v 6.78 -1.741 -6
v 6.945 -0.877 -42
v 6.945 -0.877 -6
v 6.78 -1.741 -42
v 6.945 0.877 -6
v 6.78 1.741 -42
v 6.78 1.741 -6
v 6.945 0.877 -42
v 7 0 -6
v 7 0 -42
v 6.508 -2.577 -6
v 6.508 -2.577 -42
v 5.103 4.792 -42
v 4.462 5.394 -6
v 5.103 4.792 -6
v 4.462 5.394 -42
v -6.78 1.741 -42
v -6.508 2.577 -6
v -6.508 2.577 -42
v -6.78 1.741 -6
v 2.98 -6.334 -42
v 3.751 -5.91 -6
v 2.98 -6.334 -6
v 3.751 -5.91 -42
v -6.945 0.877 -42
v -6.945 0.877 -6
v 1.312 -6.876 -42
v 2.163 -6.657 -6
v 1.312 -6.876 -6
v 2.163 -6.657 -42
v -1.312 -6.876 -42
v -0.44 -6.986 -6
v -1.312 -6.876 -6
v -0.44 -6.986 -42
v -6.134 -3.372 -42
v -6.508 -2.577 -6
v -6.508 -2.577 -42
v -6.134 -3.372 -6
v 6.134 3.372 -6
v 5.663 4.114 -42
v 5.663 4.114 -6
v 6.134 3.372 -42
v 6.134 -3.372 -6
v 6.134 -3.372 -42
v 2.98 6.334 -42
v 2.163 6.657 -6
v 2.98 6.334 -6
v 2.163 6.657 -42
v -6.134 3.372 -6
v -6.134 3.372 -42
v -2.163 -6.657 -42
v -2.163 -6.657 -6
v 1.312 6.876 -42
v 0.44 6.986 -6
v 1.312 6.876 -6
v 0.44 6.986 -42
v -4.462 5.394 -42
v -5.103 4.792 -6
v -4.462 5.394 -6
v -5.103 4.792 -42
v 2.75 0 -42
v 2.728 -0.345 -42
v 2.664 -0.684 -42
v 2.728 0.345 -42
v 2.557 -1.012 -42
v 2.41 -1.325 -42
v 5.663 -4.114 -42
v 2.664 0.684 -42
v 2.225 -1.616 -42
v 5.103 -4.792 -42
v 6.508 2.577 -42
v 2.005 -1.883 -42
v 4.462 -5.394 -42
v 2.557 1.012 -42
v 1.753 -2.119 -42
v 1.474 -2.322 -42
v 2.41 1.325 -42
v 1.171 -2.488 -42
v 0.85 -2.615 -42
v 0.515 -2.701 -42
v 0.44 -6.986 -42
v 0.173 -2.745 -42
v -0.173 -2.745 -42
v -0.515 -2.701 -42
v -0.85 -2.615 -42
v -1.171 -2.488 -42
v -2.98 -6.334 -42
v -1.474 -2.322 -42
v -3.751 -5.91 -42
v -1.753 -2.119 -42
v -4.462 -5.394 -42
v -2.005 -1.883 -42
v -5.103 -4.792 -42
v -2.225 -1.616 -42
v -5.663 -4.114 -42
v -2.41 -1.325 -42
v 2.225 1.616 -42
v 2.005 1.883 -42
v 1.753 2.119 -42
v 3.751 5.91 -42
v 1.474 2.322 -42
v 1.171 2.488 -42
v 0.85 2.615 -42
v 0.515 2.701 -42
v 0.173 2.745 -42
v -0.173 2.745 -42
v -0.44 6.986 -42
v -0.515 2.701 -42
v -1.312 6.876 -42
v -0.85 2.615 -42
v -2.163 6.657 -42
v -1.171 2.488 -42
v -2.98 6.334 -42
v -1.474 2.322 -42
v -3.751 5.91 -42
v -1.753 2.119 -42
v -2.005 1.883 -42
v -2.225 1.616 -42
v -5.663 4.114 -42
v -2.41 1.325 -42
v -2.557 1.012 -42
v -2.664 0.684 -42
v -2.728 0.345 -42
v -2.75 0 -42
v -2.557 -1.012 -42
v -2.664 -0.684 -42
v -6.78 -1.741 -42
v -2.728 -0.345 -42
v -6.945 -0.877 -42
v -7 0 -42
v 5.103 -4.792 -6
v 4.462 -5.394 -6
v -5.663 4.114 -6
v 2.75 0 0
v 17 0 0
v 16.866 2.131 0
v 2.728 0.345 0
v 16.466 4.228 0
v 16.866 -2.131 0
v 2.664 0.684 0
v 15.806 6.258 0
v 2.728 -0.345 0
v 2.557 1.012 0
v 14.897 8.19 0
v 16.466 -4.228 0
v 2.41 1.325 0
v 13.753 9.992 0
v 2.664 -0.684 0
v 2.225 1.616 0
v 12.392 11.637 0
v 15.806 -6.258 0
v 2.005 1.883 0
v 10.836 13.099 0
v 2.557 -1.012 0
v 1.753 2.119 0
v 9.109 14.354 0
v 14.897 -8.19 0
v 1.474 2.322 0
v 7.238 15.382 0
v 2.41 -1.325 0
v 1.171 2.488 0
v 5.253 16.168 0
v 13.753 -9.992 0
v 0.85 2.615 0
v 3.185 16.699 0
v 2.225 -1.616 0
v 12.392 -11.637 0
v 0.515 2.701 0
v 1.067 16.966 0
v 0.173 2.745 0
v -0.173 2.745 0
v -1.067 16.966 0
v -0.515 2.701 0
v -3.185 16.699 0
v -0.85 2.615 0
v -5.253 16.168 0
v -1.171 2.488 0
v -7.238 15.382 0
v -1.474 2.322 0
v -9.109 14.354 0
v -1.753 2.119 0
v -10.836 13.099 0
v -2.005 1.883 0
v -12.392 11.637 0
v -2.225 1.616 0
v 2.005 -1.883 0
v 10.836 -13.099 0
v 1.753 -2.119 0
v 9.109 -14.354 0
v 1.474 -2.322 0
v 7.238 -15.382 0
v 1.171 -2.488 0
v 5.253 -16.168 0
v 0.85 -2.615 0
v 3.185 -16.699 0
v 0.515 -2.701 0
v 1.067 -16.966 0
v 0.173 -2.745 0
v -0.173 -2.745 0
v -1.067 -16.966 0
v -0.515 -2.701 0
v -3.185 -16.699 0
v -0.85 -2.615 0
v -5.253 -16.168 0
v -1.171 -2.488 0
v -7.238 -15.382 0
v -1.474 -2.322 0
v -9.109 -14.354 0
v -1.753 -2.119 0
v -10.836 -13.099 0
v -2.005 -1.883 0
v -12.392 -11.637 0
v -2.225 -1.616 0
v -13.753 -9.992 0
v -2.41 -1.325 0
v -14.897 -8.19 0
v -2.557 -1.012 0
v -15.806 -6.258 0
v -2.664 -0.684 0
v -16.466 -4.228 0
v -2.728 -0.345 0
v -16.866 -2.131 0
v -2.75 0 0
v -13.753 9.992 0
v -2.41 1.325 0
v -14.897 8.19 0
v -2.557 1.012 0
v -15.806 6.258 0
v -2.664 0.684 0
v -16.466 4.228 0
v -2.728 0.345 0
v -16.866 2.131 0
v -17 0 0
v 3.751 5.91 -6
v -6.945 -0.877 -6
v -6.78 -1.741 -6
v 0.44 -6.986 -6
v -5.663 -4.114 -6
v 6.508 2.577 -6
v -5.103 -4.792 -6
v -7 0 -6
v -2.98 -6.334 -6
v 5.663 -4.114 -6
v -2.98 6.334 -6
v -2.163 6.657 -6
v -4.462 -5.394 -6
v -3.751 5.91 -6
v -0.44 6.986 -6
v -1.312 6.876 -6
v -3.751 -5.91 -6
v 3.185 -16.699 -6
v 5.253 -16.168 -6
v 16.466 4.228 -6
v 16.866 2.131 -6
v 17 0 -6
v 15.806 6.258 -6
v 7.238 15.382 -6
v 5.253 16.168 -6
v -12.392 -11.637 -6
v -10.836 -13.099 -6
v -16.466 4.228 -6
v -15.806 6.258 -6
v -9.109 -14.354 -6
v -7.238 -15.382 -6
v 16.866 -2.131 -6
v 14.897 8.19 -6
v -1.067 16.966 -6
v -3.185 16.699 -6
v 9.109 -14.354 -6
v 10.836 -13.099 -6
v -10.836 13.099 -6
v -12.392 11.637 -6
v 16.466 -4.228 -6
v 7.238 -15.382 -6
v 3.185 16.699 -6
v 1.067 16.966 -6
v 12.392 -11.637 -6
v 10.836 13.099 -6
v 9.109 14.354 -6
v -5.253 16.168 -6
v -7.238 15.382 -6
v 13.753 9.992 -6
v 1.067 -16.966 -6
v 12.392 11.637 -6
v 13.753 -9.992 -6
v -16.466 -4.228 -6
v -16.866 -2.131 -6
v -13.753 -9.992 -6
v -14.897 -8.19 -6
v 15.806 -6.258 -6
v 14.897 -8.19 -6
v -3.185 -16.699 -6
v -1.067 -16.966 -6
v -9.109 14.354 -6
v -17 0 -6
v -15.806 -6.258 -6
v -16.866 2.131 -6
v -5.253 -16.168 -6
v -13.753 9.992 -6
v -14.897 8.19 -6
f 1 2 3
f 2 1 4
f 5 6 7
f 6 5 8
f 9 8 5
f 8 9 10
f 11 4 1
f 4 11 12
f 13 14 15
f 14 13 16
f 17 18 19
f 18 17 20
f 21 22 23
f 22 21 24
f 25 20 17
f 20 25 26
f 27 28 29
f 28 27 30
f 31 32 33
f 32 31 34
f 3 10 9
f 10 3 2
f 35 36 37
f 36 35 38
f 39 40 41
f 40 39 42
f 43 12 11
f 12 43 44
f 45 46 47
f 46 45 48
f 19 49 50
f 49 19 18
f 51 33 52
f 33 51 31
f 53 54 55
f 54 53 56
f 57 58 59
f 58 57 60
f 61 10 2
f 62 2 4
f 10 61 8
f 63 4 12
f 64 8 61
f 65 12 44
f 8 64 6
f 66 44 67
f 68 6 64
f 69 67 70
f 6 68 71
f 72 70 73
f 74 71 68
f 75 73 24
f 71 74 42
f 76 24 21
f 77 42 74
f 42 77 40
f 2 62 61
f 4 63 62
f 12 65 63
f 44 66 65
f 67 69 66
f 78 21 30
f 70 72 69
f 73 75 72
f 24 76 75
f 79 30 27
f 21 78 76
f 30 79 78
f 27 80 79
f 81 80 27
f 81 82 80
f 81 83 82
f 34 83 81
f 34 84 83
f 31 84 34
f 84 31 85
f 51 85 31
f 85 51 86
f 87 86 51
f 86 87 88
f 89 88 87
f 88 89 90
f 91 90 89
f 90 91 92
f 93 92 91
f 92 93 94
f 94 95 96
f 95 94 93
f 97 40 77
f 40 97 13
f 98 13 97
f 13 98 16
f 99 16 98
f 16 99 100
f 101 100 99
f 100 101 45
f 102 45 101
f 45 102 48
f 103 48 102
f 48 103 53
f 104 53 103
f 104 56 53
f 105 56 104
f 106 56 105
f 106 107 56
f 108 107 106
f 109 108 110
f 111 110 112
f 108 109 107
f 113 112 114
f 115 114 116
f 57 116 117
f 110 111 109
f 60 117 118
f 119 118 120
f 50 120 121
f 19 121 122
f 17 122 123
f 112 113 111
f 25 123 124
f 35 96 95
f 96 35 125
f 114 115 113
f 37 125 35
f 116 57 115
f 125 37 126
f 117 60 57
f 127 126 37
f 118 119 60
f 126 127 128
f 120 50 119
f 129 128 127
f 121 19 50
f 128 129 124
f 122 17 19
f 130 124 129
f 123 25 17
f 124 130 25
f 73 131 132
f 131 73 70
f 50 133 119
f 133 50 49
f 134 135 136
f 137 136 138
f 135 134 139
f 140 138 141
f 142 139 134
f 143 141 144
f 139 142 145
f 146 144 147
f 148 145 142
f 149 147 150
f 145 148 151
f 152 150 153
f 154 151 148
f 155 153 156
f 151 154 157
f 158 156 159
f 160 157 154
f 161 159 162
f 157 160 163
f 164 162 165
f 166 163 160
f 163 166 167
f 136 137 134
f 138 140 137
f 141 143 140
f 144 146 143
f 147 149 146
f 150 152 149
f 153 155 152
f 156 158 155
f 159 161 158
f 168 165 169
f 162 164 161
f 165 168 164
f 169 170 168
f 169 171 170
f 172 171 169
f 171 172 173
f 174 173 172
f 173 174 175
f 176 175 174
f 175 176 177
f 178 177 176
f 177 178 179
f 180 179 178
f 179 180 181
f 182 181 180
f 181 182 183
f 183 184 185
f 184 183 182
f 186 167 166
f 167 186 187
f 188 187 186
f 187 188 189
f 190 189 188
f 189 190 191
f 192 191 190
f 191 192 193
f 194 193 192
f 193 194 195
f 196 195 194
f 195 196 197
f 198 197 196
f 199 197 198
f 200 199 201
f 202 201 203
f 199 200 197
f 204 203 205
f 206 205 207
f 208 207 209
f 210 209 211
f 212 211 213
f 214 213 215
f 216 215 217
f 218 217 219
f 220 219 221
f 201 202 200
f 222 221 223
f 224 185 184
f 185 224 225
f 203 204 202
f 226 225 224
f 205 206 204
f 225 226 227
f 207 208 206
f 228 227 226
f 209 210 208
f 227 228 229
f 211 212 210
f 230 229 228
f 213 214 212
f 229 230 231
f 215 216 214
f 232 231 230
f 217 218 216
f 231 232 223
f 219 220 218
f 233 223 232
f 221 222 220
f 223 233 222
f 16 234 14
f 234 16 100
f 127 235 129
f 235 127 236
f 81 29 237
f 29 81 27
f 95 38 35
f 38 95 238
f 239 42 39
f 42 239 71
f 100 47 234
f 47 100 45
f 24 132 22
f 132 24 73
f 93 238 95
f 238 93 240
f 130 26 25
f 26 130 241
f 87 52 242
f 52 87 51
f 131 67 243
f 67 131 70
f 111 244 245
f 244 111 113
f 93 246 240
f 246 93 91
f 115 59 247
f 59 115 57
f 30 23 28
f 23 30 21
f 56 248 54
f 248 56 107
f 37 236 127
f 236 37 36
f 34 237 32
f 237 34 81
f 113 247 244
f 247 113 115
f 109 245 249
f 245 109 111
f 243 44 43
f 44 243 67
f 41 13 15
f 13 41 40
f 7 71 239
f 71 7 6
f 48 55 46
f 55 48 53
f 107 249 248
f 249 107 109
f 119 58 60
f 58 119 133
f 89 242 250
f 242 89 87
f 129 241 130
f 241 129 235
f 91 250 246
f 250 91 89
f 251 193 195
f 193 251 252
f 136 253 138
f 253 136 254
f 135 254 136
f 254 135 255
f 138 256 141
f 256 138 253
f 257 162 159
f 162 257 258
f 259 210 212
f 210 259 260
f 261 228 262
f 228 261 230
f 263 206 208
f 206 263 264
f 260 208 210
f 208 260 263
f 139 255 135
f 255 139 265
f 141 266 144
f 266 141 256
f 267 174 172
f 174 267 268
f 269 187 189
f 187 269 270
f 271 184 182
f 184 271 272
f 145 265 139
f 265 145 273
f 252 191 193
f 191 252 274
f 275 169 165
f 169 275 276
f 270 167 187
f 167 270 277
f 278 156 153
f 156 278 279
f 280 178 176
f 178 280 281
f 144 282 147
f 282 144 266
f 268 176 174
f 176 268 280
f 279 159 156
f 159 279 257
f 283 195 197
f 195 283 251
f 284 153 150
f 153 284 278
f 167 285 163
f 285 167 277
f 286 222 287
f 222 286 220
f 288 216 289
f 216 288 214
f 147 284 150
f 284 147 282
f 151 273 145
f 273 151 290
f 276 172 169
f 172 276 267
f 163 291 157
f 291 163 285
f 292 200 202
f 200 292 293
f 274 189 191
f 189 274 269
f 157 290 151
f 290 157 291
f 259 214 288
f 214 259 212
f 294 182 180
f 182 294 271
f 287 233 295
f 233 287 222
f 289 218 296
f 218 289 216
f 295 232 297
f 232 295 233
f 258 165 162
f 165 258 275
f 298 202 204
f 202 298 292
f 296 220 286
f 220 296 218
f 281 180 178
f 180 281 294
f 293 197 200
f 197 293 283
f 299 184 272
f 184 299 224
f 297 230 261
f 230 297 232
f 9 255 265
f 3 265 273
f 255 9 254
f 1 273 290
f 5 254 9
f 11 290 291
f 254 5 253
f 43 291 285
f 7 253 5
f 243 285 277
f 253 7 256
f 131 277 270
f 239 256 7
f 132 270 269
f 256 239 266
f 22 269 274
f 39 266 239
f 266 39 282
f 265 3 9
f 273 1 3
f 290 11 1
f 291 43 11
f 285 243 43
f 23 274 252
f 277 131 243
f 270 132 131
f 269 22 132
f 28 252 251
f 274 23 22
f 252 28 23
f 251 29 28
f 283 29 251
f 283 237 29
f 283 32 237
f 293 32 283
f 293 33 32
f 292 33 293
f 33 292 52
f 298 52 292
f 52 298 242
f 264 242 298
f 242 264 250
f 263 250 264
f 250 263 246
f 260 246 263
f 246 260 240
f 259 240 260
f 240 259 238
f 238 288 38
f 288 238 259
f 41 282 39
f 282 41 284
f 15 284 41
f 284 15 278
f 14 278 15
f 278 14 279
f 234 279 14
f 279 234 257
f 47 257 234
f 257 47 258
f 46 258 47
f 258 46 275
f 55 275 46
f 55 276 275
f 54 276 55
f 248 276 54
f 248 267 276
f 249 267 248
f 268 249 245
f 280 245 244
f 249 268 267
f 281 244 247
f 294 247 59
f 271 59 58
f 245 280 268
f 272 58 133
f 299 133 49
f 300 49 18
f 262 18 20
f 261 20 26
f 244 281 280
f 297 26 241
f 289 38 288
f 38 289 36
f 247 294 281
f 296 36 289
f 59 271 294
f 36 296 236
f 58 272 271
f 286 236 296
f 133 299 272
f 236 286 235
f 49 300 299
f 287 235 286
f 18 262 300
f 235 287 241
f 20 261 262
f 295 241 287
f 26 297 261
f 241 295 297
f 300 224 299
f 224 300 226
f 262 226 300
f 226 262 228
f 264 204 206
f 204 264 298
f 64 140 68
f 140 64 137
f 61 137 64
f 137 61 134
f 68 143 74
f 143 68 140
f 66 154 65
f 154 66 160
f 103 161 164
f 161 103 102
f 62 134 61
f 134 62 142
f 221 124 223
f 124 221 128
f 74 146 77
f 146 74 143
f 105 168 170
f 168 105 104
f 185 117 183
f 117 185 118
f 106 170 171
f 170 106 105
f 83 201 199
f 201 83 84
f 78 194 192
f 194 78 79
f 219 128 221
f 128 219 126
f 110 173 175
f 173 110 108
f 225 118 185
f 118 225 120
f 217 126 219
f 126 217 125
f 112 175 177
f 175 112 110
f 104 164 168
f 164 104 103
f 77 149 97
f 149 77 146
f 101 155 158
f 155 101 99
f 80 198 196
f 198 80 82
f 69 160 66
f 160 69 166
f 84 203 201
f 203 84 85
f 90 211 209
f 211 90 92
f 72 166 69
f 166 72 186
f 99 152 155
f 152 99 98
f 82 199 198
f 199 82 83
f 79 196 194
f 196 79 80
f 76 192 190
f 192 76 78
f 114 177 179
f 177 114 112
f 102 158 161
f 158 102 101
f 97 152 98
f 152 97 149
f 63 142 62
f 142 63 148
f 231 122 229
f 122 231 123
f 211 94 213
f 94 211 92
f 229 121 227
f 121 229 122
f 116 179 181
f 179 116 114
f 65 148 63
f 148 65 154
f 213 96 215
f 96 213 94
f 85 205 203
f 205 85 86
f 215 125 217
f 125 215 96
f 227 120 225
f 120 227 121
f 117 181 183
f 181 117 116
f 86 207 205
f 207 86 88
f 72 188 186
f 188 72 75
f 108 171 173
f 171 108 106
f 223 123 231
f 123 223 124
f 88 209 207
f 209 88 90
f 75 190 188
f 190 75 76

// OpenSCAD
$fn = 50;


difference() {
	union() {
		translate(v = [0, 0, -42.0000000000]) {
			cylinder(h = 42, r = 7.0000000000);
		}
		translate(v = [0, 0, -6.0000000000]) {
			cylinder(h = 6, r = 17.0000000000);
		}
	}
	union() {
		#translate(v = [0, 0, -42]) {
			cylinder(h = 42, r = 2.7500000000);
		}
	}
}
